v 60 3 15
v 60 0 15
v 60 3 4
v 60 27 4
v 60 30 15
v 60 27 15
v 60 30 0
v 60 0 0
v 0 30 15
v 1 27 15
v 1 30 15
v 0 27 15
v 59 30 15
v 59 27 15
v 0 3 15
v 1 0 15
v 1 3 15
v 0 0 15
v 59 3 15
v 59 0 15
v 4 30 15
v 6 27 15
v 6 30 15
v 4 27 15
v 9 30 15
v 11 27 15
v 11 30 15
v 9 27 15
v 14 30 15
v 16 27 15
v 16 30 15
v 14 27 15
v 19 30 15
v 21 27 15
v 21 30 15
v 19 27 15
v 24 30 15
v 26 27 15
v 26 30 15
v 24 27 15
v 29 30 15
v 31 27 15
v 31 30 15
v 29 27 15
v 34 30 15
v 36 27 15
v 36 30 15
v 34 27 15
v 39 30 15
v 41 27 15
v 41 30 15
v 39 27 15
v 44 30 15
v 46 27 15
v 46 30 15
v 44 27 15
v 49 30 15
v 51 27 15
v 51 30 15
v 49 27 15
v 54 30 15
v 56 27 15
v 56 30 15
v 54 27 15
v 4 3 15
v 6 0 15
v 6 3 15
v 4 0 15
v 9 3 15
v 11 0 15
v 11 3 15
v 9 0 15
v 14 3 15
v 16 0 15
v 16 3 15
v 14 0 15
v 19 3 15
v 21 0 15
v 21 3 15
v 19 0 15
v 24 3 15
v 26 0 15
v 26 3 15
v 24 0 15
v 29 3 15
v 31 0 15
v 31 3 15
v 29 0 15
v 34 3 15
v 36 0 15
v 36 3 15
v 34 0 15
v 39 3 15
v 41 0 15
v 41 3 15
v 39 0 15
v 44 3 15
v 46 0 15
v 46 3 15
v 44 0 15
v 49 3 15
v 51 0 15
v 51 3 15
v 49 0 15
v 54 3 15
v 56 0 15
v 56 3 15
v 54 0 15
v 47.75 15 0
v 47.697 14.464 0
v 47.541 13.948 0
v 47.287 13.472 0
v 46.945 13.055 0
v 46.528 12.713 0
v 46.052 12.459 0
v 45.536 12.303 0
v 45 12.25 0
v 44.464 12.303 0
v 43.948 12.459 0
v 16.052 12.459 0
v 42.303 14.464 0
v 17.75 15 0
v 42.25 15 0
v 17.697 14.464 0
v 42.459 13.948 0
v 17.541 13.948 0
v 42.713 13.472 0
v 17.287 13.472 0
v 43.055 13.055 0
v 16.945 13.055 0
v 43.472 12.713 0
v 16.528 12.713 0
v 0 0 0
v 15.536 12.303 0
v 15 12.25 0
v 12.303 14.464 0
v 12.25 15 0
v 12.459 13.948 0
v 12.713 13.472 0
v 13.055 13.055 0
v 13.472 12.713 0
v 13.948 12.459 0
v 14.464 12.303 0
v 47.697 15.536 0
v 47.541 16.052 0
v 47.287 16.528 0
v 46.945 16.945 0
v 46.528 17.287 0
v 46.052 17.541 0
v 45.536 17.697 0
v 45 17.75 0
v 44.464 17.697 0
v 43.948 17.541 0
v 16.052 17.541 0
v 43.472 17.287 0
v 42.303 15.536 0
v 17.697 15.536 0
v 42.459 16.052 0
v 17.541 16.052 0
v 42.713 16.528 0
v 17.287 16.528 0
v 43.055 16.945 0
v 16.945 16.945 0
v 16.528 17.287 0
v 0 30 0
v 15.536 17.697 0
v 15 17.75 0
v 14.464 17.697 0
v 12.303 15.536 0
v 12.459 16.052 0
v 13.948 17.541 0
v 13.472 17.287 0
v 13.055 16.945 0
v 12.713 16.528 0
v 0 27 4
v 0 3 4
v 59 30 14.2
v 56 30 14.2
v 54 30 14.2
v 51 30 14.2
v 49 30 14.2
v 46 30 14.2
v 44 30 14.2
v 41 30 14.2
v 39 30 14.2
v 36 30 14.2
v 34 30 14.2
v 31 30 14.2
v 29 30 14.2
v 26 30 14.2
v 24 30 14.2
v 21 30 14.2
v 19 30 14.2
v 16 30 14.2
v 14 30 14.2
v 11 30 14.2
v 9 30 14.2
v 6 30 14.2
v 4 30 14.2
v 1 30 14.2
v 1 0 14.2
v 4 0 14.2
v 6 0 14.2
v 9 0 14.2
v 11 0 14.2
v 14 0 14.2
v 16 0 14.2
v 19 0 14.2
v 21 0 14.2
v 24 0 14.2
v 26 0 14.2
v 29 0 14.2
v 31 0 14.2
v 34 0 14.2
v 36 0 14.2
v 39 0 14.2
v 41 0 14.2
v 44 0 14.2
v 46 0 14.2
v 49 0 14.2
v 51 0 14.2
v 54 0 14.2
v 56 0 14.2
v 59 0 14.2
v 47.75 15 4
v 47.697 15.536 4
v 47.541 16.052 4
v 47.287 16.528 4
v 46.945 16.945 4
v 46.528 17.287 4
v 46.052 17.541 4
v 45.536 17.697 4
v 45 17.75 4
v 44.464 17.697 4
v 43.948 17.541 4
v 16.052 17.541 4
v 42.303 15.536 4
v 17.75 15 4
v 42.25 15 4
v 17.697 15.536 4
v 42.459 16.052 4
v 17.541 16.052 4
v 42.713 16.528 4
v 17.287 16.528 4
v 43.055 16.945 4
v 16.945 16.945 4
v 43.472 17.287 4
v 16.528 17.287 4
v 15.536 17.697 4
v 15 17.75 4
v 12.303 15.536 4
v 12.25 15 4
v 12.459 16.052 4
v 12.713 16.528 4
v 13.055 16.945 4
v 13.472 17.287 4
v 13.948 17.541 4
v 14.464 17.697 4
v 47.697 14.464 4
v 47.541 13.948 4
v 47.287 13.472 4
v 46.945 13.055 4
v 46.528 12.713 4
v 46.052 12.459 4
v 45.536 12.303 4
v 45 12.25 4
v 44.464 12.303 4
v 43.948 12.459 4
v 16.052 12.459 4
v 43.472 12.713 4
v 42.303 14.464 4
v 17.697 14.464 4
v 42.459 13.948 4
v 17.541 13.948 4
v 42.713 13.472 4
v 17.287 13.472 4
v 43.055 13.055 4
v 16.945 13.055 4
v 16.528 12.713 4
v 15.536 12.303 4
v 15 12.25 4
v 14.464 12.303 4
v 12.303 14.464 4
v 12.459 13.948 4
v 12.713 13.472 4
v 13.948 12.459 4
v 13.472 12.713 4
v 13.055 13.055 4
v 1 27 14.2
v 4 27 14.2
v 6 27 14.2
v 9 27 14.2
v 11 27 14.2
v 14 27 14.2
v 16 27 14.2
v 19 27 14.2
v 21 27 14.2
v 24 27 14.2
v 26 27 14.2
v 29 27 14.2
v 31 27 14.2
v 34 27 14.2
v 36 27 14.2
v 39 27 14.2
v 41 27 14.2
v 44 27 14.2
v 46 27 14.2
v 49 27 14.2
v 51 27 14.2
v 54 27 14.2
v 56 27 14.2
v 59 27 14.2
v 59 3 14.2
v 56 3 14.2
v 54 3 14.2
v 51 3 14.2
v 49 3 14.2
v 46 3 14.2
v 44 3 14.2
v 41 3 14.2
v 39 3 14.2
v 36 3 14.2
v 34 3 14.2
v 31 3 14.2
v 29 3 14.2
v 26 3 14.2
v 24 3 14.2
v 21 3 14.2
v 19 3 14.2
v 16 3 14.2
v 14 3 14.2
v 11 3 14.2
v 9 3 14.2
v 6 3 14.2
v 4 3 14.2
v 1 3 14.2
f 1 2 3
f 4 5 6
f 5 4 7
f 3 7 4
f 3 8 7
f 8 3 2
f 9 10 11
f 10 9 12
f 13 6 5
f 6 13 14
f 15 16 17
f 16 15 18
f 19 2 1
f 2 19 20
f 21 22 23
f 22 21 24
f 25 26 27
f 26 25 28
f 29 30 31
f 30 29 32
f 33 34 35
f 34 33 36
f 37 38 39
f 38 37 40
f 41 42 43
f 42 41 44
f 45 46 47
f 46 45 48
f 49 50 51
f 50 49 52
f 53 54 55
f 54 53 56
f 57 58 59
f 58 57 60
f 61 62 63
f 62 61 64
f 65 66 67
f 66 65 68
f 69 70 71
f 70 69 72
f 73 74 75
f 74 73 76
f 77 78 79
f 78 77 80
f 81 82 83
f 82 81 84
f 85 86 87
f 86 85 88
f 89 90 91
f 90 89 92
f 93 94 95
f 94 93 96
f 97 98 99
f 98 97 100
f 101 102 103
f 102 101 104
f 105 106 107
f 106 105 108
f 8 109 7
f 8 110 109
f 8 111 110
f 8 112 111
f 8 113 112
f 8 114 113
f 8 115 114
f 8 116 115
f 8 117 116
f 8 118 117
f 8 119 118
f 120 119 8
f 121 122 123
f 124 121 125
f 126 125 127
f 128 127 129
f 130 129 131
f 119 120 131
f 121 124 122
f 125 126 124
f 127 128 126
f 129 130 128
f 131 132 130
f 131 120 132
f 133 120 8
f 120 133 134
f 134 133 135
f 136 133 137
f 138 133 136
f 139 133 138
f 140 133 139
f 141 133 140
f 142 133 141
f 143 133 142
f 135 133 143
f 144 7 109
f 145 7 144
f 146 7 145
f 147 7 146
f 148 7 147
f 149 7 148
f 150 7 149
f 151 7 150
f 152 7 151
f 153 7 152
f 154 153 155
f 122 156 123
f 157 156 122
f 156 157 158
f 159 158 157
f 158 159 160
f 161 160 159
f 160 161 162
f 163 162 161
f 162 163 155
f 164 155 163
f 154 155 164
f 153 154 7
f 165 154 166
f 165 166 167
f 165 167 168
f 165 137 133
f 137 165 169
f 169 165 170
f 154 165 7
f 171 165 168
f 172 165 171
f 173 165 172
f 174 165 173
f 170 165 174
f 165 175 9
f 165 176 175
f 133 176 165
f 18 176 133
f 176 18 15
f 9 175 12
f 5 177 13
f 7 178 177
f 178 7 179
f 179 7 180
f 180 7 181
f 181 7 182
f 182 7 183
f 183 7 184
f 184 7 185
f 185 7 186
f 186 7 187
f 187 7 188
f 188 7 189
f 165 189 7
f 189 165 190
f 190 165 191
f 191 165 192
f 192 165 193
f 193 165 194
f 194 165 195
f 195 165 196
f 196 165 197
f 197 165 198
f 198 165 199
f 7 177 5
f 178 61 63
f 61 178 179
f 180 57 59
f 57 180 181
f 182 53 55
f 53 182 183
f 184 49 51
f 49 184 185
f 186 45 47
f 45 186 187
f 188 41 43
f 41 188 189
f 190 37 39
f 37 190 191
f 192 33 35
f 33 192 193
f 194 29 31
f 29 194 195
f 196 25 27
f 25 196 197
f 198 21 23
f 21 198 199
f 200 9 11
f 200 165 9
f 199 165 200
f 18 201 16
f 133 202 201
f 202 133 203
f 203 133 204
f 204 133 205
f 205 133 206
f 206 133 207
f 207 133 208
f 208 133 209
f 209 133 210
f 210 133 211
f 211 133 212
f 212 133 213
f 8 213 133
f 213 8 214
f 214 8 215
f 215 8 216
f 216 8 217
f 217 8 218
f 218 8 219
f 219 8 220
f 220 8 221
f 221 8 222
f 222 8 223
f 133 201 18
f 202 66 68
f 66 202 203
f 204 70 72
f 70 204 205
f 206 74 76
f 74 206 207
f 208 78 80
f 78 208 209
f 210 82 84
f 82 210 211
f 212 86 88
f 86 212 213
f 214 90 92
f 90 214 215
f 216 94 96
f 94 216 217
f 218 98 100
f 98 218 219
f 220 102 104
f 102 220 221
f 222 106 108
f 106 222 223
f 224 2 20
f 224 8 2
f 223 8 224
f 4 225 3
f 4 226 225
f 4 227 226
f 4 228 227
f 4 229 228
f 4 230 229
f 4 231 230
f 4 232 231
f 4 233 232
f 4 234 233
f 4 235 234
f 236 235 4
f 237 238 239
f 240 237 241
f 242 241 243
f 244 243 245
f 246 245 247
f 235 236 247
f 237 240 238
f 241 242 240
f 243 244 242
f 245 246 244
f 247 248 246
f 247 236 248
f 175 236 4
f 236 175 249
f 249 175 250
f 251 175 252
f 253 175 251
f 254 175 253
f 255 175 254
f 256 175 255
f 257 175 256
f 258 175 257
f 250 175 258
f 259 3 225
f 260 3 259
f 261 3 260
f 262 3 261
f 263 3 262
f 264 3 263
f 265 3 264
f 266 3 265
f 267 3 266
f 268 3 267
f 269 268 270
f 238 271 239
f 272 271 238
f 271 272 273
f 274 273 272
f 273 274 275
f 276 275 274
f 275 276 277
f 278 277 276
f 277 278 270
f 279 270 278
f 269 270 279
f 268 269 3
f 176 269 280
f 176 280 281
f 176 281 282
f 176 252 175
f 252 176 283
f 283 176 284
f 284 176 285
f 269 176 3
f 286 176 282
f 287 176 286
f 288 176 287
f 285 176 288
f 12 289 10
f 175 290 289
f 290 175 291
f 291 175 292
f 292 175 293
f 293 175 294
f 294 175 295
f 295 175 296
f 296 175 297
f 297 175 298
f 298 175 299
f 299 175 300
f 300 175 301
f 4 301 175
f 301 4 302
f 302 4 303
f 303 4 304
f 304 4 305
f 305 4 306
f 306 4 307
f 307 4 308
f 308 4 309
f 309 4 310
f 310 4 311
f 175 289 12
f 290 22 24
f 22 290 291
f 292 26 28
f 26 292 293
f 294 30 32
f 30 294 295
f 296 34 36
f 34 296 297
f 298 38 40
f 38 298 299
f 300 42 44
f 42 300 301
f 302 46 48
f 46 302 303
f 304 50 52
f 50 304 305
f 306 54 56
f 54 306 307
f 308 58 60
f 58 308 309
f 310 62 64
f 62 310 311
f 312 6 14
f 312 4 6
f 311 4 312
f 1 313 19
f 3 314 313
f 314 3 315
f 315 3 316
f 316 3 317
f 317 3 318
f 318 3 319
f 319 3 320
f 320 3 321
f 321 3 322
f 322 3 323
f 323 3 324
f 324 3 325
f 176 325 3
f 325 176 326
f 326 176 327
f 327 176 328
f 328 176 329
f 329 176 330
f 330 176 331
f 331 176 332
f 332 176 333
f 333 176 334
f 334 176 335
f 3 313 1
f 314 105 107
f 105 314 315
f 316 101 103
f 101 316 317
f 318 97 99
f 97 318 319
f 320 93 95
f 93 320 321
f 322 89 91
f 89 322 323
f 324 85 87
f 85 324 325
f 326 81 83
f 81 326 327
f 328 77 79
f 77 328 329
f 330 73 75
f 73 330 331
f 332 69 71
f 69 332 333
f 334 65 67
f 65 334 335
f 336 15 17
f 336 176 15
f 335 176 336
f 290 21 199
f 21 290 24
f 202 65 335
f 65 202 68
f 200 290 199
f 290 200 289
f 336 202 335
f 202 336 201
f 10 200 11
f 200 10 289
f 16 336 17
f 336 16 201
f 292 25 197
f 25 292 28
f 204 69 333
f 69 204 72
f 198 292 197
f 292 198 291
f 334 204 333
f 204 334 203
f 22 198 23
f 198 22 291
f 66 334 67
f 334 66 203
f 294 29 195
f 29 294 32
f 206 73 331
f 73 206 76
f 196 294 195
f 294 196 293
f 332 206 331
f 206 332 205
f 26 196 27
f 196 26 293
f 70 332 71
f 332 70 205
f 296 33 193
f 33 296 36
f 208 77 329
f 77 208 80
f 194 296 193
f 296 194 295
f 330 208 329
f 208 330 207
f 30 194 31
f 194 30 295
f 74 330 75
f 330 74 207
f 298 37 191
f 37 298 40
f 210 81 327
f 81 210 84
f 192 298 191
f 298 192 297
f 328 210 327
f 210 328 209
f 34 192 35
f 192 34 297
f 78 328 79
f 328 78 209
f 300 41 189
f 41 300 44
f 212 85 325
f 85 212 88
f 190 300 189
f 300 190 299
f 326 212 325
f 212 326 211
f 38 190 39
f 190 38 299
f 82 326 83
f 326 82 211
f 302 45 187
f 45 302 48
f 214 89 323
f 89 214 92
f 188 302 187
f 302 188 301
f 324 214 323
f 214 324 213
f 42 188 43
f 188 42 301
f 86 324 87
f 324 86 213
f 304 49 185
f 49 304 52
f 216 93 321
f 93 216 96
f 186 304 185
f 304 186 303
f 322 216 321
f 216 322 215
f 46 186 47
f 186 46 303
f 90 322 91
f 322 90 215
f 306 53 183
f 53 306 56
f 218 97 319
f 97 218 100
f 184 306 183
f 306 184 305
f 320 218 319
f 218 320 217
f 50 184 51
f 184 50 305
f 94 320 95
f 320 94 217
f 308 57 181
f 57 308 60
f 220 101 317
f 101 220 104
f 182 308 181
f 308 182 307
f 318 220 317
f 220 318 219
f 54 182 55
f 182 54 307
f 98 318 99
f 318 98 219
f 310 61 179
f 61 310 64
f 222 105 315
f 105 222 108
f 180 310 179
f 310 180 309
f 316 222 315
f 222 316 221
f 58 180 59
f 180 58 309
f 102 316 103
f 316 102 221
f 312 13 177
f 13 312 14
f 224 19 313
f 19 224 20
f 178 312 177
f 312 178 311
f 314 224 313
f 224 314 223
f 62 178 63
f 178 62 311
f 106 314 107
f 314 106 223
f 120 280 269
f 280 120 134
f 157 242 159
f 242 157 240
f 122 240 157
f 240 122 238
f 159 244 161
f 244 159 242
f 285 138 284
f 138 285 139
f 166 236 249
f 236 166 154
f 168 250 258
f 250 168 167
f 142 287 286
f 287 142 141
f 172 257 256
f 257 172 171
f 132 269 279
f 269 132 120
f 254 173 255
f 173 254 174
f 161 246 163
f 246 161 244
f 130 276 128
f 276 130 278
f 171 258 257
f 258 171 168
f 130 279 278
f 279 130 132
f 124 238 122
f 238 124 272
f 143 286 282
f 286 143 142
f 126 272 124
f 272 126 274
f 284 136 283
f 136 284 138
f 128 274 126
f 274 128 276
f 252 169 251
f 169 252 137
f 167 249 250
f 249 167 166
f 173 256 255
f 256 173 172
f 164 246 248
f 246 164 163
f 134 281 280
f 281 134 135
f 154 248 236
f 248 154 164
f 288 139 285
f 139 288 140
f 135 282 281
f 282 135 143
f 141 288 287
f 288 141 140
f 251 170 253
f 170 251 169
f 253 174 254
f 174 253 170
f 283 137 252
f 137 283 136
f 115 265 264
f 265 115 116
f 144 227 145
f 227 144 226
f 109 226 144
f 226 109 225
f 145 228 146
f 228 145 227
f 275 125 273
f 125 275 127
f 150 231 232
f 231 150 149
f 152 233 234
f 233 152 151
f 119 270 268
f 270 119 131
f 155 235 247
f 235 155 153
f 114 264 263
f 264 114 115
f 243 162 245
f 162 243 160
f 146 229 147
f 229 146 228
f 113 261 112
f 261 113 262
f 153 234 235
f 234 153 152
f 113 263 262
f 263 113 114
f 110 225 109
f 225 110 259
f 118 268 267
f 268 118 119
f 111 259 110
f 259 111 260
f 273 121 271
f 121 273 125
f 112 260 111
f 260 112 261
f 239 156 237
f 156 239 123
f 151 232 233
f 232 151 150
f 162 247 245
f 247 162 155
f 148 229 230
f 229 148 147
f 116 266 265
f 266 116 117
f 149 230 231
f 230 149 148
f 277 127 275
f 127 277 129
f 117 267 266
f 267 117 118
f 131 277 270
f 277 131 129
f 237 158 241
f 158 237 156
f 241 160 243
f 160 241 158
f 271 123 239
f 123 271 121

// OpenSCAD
$fn = 32;

// ----------------------------------------------------------------------
// Cable duct: 60 x 30 x 15 mm, 12 fingers
// ----------------------------------------------------------------------

// --- parameters (mm) ---
duct_len = 60;            // duct length, X
duct_w = 30;              // duct width, Y
duct_h = 15;              // duct height, Z
wall_t = 3;               // side wall thickness
floor_t = 4;              // floor thickness
slot_w = 3;               // finger slot width
slot_h = 10.2;            // finger slot height
fingers = 12;             // number of finger slots per side
pitch = 5;                // finger pitch
hole_d = 5.5;             // floor mounting hole
hole_n = 2;               // mounting holes in the floor

module shell() {
  difference() {
    cube([duct_len, duct_w, duct_h]);
    /* open top channel */
    translate([-wall_t - 1, wall_t, floor_t])
      cube([duct_len + 2 * wall_t + 2, duct_w - 2 * wall_t, duct_h + 1]);
  }
}

difference() {
  union() {
    shell();
  }
  /* finger slots cut through both side walls */
  for (i = [0 : fingers - 1]) translate([pitch / 2 + i * pitch - slot_w / 2, -1, floor_t + slot_h]) cube([slot_w, duct_w + 2, duct_h]);
  for (i = [0 : hole_n - 1]) translate([(duct_len / hole_n) * (i + 0.5), duct_w / 2, -1]) cylinder(h = floor_t + 2, d = hole_d);
}
